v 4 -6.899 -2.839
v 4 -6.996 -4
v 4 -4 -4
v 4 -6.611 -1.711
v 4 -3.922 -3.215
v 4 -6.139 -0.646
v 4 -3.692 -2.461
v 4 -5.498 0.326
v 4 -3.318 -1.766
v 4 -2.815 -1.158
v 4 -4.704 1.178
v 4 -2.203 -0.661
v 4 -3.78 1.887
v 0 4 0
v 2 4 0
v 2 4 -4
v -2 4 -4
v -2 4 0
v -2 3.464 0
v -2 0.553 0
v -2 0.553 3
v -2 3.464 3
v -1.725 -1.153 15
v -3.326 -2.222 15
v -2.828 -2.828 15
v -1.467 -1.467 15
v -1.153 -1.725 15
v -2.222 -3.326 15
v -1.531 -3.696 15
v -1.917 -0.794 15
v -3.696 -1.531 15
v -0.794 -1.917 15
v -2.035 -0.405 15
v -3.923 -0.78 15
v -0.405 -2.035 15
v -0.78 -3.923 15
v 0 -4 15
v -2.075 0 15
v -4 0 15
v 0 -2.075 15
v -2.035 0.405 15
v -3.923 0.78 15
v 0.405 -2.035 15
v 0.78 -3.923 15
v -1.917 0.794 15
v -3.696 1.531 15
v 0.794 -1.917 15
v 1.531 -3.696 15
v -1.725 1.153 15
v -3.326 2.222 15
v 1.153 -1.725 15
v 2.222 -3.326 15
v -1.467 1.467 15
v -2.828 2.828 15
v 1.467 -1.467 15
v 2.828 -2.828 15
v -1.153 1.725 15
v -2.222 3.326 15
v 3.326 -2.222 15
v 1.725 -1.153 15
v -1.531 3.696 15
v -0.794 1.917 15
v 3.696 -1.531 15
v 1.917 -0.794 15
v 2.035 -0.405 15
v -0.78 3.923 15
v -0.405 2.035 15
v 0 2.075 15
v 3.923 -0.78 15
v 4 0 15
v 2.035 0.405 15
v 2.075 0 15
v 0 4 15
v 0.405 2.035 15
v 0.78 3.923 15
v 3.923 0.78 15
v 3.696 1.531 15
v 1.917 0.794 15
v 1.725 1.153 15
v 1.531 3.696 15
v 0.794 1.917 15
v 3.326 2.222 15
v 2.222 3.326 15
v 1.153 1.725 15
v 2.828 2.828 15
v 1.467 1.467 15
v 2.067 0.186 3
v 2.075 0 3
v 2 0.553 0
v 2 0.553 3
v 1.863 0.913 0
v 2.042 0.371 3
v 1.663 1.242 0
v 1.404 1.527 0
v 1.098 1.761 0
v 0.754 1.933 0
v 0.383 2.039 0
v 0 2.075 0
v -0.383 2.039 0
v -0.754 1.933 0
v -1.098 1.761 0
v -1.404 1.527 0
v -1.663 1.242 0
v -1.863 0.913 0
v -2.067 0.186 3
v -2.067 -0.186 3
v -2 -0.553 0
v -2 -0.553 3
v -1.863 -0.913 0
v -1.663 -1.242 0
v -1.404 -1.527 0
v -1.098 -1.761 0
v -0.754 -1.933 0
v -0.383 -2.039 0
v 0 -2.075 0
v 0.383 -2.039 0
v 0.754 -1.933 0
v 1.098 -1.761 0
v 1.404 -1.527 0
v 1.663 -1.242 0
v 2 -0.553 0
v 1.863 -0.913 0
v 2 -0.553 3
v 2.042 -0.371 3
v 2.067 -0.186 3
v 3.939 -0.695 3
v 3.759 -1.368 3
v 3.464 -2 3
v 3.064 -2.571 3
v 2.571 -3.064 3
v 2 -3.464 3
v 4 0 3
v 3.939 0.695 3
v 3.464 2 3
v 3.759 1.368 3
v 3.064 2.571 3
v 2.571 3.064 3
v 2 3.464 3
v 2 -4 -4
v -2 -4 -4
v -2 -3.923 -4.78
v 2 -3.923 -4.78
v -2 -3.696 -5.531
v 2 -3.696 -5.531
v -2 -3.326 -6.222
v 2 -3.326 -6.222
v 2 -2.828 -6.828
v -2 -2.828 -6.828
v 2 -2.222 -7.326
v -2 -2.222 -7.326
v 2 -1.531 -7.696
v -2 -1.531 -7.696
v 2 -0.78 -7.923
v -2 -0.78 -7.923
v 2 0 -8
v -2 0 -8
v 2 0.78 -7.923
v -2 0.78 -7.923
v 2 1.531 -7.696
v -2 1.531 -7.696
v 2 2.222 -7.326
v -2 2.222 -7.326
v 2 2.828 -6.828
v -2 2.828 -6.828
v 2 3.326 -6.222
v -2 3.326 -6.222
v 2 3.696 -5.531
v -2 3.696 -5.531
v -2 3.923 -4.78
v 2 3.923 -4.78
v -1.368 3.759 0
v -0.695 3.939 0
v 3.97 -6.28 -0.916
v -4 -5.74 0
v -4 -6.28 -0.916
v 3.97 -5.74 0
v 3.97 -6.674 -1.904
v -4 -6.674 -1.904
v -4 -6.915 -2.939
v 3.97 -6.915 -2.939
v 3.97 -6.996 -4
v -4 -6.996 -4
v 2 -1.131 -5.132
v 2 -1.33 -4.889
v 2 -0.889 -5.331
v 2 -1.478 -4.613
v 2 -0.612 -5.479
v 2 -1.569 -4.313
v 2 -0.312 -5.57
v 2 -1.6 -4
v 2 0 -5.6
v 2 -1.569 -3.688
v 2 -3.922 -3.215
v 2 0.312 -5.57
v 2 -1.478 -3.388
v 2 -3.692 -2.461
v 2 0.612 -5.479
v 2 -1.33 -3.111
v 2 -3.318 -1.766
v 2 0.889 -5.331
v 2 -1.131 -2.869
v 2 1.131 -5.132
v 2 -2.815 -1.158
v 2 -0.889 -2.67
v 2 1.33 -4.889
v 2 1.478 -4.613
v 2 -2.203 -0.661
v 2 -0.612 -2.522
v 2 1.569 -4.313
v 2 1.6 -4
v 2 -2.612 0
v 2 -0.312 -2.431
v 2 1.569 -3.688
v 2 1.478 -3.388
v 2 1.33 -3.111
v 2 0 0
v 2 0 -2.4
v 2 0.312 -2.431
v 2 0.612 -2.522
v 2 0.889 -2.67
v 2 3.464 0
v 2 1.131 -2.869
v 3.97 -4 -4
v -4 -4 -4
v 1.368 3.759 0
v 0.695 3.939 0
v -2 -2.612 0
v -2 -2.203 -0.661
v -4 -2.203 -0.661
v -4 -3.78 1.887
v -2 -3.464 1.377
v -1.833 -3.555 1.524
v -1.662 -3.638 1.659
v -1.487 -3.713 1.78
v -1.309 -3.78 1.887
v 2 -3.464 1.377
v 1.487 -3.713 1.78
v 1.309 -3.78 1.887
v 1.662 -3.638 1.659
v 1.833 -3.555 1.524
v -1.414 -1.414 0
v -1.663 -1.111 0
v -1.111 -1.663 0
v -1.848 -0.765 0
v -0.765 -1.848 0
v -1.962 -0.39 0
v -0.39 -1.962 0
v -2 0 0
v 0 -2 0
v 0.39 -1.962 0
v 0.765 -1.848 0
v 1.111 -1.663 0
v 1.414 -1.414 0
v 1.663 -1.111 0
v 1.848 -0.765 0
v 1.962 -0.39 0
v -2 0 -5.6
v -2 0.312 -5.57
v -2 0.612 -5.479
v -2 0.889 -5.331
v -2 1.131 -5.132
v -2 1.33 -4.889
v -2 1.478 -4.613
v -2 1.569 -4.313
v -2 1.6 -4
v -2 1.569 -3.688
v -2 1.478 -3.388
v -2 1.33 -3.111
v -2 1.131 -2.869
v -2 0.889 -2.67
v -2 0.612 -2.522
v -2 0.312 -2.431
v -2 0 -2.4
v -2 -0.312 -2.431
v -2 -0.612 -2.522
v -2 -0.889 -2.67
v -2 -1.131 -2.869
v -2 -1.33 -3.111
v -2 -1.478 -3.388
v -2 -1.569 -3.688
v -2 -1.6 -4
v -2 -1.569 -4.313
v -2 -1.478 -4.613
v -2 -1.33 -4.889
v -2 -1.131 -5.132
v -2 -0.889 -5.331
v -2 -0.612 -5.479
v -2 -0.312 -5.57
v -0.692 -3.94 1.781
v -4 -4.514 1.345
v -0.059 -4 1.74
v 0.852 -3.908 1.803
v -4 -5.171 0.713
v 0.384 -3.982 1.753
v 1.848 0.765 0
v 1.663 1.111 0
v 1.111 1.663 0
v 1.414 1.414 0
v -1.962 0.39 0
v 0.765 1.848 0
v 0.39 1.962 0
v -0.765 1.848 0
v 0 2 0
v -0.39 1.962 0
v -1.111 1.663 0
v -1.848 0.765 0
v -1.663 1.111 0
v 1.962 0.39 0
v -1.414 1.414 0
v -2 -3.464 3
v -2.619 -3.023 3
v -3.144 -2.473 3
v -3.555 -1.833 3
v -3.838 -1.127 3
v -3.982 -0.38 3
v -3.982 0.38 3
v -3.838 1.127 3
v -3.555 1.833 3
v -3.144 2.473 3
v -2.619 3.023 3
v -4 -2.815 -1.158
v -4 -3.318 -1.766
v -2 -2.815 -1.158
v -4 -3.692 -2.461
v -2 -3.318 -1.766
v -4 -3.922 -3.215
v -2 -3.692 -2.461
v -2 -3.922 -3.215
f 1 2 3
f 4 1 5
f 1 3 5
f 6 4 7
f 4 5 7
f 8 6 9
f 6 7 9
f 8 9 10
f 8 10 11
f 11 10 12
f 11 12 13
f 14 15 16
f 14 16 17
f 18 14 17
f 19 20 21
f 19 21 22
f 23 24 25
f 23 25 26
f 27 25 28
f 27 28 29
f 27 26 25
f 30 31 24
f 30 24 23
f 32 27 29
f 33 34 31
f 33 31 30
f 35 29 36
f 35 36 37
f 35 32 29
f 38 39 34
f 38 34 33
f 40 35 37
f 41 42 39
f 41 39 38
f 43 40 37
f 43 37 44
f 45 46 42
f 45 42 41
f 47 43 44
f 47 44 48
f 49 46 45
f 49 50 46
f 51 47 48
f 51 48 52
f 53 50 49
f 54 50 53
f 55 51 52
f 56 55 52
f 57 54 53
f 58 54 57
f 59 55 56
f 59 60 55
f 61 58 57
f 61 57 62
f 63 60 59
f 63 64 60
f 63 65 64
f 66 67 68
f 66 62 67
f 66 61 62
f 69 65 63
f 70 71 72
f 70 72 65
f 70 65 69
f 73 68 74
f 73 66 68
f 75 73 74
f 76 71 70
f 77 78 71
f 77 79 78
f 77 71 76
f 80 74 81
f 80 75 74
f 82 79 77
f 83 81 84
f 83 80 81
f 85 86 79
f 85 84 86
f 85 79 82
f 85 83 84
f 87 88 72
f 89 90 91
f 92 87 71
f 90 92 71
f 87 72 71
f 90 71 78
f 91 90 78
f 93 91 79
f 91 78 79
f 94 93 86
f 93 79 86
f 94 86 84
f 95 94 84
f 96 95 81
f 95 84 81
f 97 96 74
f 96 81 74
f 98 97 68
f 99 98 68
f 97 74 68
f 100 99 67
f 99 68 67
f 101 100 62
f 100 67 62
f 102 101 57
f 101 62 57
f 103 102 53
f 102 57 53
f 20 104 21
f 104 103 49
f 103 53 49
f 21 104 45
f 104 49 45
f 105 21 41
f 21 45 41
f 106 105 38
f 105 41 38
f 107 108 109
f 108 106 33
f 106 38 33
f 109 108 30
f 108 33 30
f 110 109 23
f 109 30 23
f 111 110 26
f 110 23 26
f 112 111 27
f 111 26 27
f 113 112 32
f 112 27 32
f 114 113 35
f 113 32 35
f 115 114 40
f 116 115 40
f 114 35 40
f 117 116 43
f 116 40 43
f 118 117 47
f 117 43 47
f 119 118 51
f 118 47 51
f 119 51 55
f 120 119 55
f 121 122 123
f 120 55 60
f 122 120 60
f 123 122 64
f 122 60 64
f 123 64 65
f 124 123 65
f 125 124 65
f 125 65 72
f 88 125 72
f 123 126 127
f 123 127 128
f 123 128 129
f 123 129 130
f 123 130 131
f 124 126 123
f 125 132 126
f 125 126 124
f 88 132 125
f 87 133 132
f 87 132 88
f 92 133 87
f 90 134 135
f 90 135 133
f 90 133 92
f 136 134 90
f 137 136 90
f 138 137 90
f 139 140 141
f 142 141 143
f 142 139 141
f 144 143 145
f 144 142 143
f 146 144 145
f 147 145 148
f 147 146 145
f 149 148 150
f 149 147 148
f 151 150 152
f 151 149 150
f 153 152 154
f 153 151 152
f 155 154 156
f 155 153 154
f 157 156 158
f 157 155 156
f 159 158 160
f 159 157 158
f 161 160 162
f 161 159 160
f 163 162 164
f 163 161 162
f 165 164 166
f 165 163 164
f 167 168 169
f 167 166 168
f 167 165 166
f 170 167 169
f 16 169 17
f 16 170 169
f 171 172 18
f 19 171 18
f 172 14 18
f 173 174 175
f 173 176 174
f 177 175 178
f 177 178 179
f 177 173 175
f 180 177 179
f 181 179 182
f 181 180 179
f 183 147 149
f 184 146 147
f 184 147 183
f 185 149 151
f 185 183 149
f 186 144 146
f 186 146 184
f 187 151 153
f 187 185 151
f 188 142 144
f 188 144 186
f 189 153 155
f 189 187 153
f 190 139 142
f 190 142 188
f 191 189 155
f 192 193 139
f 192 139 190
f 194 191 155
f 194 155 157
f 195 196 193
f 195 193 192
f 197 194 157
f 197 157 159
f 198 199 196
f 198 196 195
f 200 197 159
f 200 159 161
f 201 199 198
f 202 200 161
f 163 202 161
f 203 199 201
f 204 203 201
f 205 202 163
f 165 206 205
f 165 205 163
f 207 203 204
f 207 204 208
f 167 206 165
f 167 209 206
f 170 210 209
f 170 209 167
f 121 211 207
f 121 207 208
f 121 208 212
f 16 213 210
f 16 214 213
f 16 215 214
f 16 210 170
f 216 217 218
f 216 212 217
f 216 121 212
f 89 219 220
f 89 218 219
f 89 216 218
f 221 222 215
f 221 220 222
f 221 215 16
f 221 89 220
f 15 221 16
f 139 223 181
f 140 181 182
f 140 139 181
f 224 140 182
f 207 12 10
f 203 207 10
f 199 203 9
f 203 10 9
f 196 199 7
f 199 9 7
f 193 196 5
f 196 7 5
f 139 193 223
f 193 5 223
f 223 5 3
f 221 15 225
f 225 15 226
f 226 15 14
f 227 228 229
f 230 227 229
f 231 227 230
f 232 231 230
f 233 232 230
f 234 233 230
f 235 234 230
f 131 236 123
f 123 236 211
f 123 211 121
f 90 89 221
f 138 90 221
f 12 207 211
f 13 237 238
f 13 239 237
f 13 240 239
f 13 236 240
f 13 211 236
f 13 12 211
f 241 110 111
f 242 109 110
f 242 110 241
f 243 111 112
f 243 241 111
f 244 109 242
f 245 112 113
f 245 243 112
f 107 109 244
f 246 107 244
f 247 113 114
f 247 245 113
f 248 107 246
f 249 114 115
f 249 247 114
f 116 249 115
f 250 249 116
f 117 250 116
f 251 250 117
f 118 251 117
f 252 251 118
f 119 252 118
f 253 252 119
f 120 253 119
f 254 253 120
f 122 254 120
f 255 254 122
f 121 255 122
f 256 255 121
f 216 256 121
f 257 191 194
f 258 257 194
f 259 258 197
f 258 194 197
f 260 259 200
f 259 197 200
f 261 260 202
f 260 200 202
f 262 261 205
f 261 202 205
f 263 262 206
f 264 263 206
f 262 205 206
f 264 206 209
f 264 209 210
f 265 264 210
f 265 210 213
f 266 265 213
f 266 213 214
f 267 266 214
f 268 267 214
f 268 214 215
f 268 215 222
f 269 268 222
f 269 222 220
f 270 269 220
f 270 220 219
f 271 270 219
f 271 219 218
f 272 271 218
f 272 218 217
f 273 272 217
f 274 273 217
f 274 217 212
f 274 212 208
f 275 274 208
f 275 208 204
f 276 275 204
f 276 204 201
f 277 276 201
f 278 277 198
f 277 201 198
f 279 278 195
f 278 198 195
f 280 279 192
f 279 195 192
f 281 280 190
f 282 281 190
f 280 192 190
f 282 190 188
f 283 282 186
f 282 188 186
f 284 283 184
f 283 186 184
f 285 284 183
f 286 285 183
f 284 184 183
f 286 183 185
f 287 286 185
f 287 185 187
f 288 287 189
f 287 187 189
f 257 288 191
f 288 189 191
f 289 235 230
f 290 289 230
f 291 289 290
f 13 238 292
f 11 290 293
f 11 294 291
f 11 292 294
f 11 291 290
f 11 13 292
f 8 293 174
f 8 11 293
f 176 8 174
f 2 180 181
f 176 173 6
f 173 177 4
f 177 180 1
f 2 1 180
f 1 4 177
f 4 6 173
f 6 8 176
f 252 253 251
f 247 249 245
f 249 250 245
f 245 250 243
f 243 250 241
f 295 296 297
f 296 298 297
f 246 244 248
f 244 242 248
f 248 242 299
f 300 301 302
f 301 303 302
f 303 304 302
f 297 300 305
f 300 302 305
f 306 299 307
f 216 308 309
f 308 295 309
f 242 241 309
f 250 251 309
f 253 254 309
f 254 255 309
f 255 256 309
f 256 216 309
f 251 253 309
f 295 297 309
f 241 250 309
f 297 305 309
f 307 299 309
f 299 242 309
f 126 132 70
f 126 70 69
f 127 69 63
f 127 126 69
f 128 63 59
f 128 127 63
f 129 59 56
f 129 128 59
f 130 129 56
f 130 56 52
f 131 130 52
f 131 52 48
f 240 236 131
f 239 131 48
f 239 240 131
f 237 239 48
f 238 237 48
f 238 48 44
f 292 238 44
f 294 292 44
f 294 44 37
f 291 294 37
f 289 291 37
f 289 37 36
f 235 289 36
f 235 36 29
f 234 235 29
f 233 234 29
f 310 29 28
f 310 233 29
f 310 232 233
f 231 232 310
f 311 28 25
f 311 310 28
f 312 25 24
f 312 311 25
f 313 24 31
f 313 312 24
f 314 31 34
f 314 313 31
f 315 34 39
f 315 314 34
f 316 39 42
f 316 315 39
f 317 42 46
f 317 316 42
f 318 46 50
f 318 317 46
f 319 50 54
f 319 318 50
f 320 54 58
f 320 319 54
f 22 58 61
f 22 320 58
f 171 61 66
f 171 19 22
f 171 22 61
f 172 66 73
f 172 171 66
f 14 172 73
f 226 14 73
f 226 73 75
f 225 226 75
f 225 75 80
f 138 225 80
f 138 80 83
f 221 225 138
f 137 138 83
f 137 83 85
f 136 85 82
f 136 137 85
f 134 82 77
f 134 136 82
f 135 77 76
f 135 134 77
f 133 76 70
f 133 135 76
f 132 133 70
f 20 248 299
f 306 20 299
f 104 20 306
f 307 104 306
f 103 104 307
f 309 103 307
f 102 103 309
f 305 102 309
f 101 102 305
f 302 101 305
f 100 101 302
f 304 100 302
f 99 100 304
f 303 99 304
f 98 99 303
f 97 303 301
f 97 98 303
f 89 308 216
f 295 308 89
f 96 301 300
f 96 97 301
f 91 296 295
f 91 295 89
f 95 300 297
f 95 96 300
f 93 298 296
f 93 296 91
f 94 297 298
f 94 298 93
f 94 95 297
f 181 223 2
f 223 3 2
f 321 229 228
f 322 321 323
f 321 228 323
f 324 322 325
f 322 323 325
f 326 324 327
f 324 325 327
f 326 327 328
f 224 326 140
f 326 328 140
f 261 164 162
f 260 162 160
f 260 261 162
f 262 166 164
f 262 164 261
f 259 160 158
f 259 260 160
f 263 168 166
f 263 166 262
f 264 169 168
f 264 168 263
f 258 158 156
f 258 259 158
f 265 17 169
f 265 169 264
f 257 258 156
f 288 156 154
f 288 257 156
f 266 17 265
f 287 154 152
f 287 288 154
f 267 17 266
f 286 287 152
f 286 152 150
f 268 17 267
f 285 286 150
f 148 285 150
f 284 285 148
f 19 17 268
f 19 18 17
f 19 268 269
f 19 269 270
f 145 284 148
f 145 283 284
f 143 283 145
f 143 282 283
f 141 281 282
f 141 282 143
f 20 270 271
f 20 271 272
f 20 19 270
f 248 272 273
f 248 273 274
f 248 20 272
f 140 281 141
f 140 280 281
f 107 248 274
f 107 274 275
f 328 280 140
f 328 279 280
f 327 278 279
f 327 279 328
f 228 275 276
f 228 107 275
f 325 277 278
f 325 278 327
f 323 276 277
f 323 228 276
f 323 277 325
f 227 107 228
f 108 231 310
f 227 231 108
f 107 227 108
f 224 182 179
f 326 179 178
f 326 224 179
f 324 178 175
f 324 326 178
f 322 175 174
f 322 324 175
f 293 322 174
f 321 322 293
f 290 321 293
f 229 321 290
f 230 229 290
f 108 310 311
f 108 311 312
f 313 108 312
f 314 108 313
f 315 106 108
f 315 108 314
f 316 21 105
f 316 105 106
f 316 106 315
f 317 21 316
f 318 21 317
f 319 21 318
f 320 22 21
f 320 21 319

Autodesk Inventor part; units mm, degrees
ref_plane "YZ Plane" through (0, 0, 0) normal (1, 0, 0) x (0, 1, 0)
ref_plane "XZ Plane" through (0, 0, 0) normal (0, 1, 0) x (-1, 0, 0)
ref_plane "XY Plane" through (0, 0, 0) normal (0, 0, 1) x (1, 0, 0)
sketch "Sketch1" plane through (0, 0, 0) normal (0, 0, 1) x (1, 0, 0)
  circle A0 centre (0, 0) radius 2
  circle A1 centre (0, 0) radius 4
  dimension "d0" = 4
  dimension "d1" = 8
extrude "Extrusion1" add sketch "Sketch1" along normal blind 15
sketch "Sketch2" plane through (0, 0, 0) normal (0, 0, -1) x (-1, 0, 0)
  circle A0 centre (0, 0) radius 4 projected
  line L0 (0, 4) -> (4, 4)
  line L1 (4, 4) -> (4, -4)
  line L2 (4, -4) -> (0, -4)
  line L3 (0, -4) -> (0, 4)
  line L4 (4, -4) -> (-4, -4)
  line L5 (-4, -4) -> (-4, 4)
  line L6 (-4, 4) -> (4, 4)
  line L7 (4, 4) -> (4, -4)
extrude "Extrusion2" add sketch "Sketch2" along normal blind 8
sketch "Sketch3" plane through (4, 0, 0) normal (1, 0, 0) x (0, 0, -1)
  circle A0 centre (4, 0) radius 4
  line L0 (0, 4) -> (0, 0) projected
  line L1 (8, 4) -> (8, -4) projected
  line L2 (0, 4) -> (8, 4)
  line L3 (8, 4) -> (8, -4)
  line L4 (8, -4) -> (0, -4)
  line L5 (0, -4) -> (0, 4)
  point P0 (4, -4)
  point P1 (8, 0)
  point P2 (4, 4)
extrude "Extrusion3" cut sketch "Sketch3" against normal blind 8 contours L1 L4 A0 | A0 L2 L1
sketch "Sketch4" plane through (4, 0, 0) normal (1, 0, 0) x (0, 0, -1)
  circle A0 centre (4.0004, 0) radius 1.6
  point P0 (0, 0)
  dimension "d8" = 3.2
extrude "Extrusion4" cut sketch "Sketch4" against normal blind 8
sketch "Sketch5" plane through (0, 0, 0) normal (0, 0, 1) x (1, 0, 0)
  line L0 (0, 4) -> (4, 4) projected
  line L1 (0, -4) -> (-4, -4) projected
  line L2 (2, 4) -> (-2, 4)
  line L3 (-2, 4) -> (-2, -4)
  line L4 (-2, -4) -> (2, -4)
  line L5 (2, -4) -> (2, 4)
  line L6 (4, -4) -> (0, -4) projected
  line L7 (4, -4) -> (-4, -4)
  line L8 (-4, -4) -> (-4, 4)
  line L9 (-4, 4) -> (4, 4)
  line L10 (4, 4) -> (4, -4)
  point P0 (0, 0)
extrude "Extrusion5" cut sketch "Sketch5" against normal blind 8 contours L0 L10 L6 L5 | L3 L1 L8 L9
sketch "Sketch6" plane through (0, -4, 0) normal (0, -1, 0) x (1, 0, 0)
  line L0 (-2, -4) -> (2, -4) projected
  line L1 (-2, 0) -> (-4, 0) projected
  line L2 (0, -4) -> (-4, -4)
  line L3 (-4, -4) -> (-4, 0)
  line L4 (-4, 0) -> (0, 0)
  line L5 (0, 0) -> (0, -4)
  line L6 (0, -4) -> (3.9704, -4)
  line L7 (3.9704, -4) -> (3.9704, 0)
  line L8 (3.9704, 0) -> (0, 0)
  line L9 (0, 0) -> (0, -4)
extrude "Extrusion6" add sketch "Sketch6" along normal blind 3
sketch "Sketch7" plane through (0, 0, 0) normal (0, 0, -1) x (-1, 0, 0)
  line L0 (2, 4) -> (-2, 4) projected
  line L1 (-2, -4) -> (-2, 4) projected
  line L2 (2, 4) -> (-2, 4)
  line L3 (-2, 4) -> (-2, -4)
  line L4 (-2, -4) -> (2, -4)
  line L5 (2, -4) -> (2, 4)
  line L6 (5.0463, 4) -> (-4.8372, 4)
  line L7 (-4.8372, 4) -> (-4.8372, -4)
  line L8 (-4.8372, -4) -> (5.0463, -4)
  line L9 (5.0463, -4) -> (5.0463, 4)
  point P0 (0, 0)
extrude "Extrusion7" cut sketch "Sketch7" against normal blind 3 contours L6 L9 L8 L5 | L1 L8 L7 L6
sketch "Sketch8" plane through (-2, 3.4641, 0) normal (-1, 0, 0) x (0, 0, 1)
  circle A0 centre (-3.9998, -3.4641) radius 4
  circle A1 centre (-3.9998, -3.4641) radius 6.9959
  line L0 (-0.6612, -5.6672) -> (1.8871, -7.244)
  line L1 (-3.9998, -7.4641) -> (-3.9998, -10.46)
  circle A2 centre (-3.9998, -3.4641) radius 8.7454
  line L2 (0.613, -8.7238) -> (1.7591, -10.0457)
  line L3 (-5.354, -10.3276) -> (-5.7862, -12.0251)
  point P0 (0, -3.4641)
extrude "Extrusion8" cut sketch "Sketch8" along normal mid plane 20 contours A1 L2 A2 L3 picked at (0.8234, -9.9865)
extrude "Extrusion9" add sketch "Sketch8" along normal blind 2 and the other way blind 6 contours A0 L0 A1 L1 picked at (-3.4455, -9.3945)
sketch "Sketch9" plane through (0, 0, 15) normal (0, 0, 1) x (1, 0, 0)
  arc A0 (2, 0) -> (-2, 0) centre (0, 0) ccw projected
  circle A1 centre (0, 0) radius 2.075
  dimension "d23" = 4.15
extrude "Extrusion10" cut sketch "Sketch9" against normal blind 15
properties part number "hingejoint1"
